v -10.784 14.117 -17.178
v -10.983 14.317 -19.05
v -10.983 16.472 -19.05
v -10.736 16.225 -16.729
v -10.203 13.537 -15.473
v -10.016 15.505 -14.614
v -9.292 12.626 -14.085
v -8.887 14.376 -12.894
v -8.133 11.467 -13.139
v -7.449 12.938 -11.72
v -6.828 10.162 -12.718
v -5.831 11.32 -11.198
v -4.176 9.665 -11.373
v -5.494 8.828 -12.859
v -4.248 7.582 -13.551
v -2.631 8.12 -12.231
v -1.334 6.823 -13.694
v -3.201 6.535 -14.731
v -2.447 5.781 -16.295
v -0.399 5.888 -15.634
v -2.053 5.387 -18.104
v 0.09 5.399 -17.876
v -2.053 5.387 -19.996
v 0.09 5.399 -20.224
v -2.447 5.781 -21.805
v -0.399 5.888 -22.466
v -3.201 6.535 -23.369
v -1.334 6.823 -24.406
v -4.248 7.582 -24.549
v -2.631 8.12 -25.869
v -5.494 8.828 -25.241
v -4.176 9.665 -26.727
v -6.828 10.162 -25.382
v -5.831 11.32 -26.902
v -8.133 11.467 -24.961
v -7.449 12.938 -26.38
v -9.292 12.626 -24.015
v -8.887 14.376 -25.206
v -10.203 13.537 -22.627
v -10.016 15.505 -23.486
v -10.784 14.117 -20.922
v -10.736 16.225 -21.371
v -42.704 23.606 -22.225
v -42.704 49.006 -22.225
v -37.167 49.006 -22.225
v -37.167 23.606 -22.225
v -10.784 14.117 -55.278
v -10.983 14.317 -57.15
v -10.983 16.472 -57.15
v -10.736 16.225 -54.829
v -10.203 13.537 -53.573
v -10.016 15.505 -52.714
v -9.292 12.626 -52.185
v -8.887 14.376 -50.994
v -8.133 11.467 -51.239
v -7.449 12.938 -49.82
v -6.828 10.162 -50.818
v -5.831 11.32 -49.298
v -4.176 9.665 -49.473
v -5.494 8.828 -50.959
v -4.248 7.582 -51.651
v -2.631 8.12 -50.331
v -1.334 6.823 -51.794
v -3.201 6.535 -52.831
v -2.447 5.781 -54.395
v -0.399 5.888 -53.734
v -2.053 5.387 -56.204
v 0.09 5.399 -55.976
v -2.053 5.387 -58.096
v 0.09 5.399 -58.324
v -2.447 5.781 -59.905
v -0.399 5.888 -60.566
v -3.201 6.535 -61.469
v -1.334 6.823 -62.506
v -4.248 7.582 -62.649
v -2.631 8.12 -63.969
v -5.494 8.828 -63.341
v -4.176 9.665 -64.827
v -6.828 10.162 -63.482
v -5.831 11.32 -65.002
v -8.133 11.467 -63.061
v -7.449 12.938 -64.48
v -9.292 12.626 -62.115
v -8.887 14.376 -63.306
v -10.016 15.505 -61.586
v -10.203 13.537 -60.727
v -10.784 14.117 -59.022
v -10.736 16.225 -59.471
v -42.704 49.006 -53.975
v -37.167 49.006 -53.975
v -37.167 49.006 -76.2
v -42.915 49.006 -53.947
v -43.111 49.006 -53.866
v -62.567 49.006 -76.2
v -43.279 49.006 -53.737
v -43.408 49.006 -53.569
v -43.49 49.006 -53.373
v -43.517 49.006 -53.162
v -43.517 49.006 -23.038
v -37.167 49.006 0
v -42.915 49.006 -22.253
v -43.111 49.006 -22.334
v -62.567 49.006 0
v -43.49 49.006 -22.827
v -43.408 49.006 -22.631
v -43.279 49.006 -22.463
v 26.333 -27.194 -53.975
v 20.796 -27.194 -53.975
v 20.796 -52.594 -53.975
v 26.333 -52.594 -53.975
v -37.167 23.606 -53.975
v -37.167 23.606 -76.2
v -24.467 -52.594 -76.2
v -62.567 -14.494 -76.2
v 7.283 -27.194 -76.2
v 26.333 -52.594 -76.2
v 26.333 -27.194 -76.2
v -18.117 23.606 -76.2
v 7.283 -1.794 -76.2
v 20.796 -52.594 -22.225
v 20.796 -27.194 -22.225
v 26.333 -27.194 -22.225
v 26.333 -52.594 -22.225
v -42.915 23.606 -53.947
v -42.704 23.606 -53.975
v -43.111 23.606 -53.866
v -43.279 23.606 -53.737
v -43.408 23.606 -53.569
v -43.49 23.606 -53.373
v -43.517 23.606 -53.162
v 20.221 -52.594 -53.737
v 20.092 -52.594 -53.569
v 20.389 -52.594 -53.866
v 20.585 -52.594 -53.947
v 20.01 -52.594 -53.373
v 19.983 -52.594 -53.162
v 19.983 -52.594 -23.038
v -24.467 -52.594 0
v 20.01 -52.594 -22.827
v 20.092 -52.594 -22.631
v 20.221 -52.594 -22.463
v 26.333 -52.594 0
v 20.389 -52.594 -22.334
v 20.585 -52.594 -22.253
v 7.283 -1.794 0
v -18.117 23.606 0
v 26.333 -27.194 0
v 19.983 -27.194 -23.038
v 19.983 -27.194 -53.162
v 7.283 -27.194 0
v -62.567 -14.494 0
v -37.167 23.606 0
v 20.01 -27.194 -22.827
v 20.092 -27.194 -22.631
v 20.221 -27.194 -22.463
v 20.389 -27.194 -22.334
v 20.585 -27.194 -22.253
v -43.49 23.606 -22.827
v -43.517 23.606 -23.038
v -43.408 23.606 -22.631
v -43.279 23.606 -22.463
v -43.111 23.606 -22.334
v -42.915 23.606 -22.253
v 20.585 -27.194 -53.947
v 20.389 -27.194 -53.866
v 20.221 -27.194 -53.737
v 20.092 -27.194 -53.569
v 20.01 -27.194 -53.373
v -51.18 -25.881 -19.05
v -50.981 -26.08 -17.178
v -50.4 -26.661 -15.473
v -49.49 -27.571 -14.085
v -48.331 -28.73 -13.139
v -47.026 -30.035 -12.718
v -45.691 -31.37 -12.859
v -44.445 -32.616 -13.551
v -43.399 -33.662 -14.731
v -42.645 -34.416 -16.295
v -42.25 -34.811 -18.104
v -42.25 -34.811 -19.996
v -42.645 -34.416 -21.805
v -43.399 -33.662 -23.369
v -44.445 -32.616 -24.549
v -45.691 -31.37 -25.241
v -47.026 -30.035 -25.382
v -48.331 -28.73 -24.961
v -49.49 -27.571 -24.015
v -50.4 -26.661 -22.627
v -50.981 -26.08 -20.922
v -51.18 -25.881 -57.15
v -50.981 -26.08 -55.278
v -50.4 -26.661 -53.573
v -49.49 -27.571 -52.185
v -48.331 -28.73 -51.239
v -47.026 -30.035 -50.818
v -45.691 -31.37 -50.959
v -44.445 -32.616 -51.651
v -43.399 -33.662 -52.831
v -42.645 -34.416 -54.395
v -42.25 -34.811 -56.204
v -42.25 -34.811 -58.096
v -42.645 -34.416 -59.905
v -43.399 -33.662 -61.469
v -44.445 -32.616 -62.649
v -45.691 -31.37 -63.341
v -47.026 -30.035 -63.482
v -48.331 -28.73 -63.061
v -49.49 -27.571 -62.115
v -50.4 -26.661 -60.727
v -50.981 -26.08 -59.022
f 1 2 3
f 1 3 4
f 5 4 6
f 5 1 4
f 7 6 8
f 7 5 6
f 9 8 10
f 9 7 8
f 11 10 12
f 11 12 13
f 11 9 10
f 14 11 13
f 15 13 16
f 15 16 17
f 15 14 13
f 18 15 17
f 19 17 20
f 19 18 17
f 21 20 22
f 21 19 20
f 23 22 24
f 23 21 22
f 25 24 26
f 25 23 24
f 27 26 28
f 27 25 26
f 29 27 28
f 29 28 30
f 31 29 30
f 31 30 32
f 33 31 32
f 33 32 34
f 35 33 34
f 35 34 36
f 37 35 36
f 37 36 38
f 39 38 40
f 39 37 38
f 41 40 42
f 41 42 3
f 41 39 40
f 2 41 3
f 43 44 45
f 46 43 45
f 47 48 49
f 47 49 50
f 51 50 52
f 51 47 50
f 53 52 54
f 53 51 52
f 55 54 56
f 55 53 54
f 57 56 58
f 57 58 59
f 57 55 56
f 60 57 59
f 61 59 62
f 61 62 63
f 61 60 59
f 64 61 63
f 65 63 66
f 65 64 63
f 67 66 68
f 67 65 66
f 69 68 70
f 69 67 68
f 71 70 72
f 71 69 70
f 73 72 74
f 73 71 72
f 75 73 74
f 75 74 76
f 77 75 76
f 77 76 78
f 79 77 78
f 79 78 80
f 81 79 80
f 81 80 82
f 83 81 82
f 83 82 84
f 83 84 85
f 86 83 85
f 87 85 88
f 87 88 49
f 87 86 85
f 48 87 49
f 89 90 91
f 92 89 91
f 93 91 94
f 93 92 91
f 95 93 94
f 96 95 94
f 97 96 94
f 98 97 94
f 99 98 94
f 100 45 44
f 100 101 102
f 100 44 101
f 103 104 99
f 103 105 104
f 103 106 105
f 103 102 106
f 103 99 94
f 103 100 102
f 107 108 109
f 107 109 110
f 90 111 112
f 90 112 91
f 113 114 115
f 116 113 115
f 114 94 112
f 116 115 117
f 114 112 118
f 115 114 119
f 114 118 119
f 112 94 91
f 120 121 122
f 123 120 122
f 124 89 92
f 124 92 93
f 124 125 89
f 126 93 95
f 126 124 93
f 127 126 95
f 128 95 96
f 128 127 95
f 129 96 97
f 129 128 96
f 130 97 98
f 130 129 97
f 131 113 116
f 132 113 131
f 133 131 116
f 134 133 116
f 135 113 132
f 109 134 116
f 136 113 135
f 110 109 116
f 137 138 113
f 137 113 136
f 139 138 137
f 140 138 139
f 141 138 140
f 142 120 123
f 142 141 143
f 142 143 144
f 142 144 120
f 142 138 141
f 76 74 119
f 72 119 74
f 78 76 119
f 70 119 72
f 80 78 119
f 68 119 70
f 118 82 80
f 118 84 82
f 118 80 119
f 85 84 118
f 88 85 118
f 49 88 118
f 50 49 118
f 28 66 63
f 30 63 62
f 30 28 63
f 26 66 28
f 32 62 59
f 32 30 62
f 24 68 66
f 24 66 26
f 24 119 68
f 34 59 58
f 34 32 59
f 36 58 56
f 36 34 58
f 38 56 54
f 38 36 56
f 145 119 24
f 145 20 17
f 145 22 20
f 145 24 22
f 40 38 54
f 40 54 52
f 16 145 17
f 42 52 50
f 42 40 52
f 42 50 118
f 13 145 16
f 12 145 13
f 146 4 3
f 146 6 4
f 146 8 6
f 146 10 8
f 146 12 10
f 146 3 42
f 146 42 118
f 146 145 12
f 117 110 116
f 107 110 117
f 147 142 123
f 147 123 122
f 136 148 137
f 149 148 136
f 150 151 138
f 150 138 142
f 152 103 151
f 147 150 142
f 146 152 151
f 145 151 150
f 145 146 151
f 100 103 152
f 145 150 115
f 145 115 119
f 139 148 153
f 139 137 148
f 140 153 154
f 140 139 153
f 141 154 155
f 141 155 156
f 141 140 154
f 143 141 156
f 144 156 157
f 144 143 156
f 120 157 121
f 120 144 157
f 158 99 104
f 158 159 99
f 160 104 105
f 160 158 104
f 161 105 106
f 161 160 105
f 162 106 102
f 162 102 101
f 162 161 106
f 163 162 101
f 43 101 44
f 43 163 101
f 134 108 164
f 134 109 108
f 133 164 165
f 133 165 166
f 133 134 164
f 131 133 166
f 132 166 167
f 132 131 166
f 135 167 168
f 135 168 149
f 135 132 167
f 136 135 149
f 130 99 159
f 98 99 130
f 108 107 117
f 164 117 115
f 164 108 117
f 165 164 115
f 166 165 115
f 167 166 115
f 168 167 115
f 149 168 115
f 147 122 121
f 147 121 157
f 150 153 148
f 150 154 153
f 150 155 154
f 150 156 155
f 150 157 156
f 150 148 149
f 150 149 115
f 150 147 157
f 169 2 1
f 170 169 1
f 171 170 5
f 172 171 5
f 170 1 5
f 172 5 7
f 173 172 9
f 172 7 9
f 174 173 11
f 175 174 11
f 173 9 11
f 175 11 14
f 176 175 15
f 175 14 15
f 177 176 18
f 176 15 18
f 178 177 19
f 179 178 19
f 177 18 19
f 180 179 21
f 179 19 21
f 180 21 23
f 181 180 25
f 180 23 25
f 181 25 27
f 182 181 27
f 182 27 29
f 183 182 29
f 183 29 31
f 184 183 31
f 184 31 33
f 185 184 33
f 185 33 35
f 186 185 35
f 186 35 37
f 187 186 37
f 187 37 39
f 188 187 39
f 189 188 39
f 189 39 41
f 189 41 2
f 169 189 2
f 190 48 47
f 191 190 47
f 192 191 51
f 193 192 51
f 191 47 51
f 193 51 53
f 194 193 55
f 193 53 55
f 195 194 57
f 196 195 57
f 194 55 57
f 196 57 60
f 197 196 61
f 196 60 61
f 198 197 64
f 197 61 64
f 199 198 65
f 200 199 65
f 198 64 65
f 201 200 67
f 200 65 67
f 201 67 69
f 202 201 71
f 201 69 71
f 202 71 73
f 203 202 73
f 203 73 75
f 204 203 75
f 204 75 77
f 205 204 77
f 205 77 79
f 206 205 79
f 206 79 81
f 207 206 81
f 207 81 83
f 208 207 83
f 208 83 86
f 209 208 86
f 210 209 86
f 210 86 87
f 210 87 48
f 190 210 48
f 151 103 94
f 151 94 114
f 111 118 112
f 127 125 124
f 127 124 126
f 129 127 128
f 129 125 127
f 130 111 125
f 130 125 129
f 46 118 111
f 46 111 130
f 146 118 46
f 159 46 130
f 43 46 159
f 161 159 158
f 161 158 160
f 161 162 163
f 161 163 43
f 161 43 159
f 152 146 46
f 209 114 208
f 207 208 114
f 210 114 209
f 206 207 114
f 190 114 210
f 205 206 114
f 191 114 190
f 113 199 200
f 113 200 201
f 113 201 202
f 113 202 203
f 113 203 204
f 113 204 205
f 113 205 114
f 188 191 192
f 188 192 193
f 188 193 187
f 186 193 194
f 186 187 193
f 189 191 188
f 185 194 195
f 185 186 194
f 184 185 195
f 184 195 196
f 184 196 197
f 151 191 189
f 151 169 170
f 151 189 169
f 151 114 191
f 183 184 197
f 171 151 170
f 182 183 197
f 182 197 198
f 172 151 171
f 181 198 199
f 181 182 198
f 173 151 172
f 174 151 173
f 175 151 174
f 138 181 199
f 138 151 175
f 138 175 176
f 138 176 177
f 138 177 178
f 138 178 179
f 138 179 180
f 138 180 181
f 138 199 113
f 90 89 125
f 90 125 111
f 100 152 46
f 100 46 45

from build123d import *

# Parameters (mm, degrees)
BOSS_EXTRUDE1_DEPTH = 76.2
SKETCH6_W           = 6.35
SKETCH6_H           = 31.75
CUT_EXTRUDE2_DEPTH  = 25.4
FILLET2_R           = 0.8128
SKETCH7_R           = 6.35
CUT_EXTRUDE3_DEPTH  = 76.2
CHAMFER1_SIZE       = 1.524
SKETCH8_W           = 6.35
SKETCH8_H           = 31.75
CUT_EXTRUDE4_DEPTH  = 125.609544076
FILLET3_R           = 0.8128


with BuildPart() as part:
    # Sketch2 → Boss-Extrude1 (new body)
    with BuildSketch(Plane.XY):
        Polygon((-62.567231638, 49.006214689), (-62.567231638, -14.493785311), (-24.467231638, -52.593785311), (26.332768362, -52.593785311), (26.332768362, -27.193785311), (7.282768362, -27.193785311), (7.282768362, -1.793785311), (-18.117231638, 23.606214689), (-37.167231638, 23.606214689), (-37.167231638, 49.006214689), align=None)
    extrude(amount=-BOSS_EXTRUDE1_DEPTH)

    # Sketch6 → Cut-Extrude2 (cut)
    with BuildSketch(Plane(origin=(0, 49.006214689, 0), x_dir=(1, 0, 0), z_dir=(0, 1, 0))):
        with Locations((-40.342231638, 38.1)):
            Rectangle(SKETCH6_W, SKETCH6_H)
    extrude(amount=-CUT_EXTRUDE2_DEPTH, mode=Mode.SUBTRACT)

    # Fillet2
    fillet2_edges = [part.edges().sort_by_distance(p)[0] for p in [
        (-43.517231638, 36.306214689, -22.225),
        (-43.517231638, 36.306214689, -53.975),
    ]]
    fillet(fillet2_edges, radius=FILLET2_R)

    # Sketch7 → Cut-Extrude3 (cut)
    with BuildSketch(Plane(origin=(2.744491525, 2.744491525, 0), x_dir=(0, 0, -1), z_dir=(0.7071067811865436, 0.7071067811865515, 0))):
        with Locations(Location((57.15, 11.539707349, 0), (0, 0, 90))):
            Circle(SKETCH7_R)
        with Locations(Location((19.05, 11.539707349, 0), (0, 0, 90))):
            Circle(SKETCH7_R)
    extrude(amount=-CUT_EXTRUDE3_DEPTH, mode=Mode.SUBTRACT)

    # Chamfer1
    chamfer1_edges = [part.edges().sort_by_distance(p)[0] for p in [
        (-0.925185733, 6.414168784, -19.05),
        (-0.925185733, 6.414168784, -57.15),
    ]]
    chamfer(chamfer1_edges, length=CHAMFER1_SIZE)

    # Sketch8 → Cut-Extrude4 (cut, through all)
    with BuildSketch(Plane(origin=(0, -27.193785311, 0), x_dir=(1, 0, 0), z_dir=(0, 1, 0))):
        with Locations((23.157768362, 38.1)):
            Rectangle(SKETCH8_W, SKETCH8_H)
    extrude(amount=-CUT_EXTRUDE4_DEPTH, mode=Mode.SUBTRACT)

    # Fillet3
    fillet3_edges = [part.edges().sort_by_distance(p)[0] for p in [
        (19.982768362, -39.893785311, -22.225),
        (19.982768362, -39.893785311, -53.975),
    ]]
    fillet(fillet3_edges, radius=FILLET3_R)


solid = part.part
